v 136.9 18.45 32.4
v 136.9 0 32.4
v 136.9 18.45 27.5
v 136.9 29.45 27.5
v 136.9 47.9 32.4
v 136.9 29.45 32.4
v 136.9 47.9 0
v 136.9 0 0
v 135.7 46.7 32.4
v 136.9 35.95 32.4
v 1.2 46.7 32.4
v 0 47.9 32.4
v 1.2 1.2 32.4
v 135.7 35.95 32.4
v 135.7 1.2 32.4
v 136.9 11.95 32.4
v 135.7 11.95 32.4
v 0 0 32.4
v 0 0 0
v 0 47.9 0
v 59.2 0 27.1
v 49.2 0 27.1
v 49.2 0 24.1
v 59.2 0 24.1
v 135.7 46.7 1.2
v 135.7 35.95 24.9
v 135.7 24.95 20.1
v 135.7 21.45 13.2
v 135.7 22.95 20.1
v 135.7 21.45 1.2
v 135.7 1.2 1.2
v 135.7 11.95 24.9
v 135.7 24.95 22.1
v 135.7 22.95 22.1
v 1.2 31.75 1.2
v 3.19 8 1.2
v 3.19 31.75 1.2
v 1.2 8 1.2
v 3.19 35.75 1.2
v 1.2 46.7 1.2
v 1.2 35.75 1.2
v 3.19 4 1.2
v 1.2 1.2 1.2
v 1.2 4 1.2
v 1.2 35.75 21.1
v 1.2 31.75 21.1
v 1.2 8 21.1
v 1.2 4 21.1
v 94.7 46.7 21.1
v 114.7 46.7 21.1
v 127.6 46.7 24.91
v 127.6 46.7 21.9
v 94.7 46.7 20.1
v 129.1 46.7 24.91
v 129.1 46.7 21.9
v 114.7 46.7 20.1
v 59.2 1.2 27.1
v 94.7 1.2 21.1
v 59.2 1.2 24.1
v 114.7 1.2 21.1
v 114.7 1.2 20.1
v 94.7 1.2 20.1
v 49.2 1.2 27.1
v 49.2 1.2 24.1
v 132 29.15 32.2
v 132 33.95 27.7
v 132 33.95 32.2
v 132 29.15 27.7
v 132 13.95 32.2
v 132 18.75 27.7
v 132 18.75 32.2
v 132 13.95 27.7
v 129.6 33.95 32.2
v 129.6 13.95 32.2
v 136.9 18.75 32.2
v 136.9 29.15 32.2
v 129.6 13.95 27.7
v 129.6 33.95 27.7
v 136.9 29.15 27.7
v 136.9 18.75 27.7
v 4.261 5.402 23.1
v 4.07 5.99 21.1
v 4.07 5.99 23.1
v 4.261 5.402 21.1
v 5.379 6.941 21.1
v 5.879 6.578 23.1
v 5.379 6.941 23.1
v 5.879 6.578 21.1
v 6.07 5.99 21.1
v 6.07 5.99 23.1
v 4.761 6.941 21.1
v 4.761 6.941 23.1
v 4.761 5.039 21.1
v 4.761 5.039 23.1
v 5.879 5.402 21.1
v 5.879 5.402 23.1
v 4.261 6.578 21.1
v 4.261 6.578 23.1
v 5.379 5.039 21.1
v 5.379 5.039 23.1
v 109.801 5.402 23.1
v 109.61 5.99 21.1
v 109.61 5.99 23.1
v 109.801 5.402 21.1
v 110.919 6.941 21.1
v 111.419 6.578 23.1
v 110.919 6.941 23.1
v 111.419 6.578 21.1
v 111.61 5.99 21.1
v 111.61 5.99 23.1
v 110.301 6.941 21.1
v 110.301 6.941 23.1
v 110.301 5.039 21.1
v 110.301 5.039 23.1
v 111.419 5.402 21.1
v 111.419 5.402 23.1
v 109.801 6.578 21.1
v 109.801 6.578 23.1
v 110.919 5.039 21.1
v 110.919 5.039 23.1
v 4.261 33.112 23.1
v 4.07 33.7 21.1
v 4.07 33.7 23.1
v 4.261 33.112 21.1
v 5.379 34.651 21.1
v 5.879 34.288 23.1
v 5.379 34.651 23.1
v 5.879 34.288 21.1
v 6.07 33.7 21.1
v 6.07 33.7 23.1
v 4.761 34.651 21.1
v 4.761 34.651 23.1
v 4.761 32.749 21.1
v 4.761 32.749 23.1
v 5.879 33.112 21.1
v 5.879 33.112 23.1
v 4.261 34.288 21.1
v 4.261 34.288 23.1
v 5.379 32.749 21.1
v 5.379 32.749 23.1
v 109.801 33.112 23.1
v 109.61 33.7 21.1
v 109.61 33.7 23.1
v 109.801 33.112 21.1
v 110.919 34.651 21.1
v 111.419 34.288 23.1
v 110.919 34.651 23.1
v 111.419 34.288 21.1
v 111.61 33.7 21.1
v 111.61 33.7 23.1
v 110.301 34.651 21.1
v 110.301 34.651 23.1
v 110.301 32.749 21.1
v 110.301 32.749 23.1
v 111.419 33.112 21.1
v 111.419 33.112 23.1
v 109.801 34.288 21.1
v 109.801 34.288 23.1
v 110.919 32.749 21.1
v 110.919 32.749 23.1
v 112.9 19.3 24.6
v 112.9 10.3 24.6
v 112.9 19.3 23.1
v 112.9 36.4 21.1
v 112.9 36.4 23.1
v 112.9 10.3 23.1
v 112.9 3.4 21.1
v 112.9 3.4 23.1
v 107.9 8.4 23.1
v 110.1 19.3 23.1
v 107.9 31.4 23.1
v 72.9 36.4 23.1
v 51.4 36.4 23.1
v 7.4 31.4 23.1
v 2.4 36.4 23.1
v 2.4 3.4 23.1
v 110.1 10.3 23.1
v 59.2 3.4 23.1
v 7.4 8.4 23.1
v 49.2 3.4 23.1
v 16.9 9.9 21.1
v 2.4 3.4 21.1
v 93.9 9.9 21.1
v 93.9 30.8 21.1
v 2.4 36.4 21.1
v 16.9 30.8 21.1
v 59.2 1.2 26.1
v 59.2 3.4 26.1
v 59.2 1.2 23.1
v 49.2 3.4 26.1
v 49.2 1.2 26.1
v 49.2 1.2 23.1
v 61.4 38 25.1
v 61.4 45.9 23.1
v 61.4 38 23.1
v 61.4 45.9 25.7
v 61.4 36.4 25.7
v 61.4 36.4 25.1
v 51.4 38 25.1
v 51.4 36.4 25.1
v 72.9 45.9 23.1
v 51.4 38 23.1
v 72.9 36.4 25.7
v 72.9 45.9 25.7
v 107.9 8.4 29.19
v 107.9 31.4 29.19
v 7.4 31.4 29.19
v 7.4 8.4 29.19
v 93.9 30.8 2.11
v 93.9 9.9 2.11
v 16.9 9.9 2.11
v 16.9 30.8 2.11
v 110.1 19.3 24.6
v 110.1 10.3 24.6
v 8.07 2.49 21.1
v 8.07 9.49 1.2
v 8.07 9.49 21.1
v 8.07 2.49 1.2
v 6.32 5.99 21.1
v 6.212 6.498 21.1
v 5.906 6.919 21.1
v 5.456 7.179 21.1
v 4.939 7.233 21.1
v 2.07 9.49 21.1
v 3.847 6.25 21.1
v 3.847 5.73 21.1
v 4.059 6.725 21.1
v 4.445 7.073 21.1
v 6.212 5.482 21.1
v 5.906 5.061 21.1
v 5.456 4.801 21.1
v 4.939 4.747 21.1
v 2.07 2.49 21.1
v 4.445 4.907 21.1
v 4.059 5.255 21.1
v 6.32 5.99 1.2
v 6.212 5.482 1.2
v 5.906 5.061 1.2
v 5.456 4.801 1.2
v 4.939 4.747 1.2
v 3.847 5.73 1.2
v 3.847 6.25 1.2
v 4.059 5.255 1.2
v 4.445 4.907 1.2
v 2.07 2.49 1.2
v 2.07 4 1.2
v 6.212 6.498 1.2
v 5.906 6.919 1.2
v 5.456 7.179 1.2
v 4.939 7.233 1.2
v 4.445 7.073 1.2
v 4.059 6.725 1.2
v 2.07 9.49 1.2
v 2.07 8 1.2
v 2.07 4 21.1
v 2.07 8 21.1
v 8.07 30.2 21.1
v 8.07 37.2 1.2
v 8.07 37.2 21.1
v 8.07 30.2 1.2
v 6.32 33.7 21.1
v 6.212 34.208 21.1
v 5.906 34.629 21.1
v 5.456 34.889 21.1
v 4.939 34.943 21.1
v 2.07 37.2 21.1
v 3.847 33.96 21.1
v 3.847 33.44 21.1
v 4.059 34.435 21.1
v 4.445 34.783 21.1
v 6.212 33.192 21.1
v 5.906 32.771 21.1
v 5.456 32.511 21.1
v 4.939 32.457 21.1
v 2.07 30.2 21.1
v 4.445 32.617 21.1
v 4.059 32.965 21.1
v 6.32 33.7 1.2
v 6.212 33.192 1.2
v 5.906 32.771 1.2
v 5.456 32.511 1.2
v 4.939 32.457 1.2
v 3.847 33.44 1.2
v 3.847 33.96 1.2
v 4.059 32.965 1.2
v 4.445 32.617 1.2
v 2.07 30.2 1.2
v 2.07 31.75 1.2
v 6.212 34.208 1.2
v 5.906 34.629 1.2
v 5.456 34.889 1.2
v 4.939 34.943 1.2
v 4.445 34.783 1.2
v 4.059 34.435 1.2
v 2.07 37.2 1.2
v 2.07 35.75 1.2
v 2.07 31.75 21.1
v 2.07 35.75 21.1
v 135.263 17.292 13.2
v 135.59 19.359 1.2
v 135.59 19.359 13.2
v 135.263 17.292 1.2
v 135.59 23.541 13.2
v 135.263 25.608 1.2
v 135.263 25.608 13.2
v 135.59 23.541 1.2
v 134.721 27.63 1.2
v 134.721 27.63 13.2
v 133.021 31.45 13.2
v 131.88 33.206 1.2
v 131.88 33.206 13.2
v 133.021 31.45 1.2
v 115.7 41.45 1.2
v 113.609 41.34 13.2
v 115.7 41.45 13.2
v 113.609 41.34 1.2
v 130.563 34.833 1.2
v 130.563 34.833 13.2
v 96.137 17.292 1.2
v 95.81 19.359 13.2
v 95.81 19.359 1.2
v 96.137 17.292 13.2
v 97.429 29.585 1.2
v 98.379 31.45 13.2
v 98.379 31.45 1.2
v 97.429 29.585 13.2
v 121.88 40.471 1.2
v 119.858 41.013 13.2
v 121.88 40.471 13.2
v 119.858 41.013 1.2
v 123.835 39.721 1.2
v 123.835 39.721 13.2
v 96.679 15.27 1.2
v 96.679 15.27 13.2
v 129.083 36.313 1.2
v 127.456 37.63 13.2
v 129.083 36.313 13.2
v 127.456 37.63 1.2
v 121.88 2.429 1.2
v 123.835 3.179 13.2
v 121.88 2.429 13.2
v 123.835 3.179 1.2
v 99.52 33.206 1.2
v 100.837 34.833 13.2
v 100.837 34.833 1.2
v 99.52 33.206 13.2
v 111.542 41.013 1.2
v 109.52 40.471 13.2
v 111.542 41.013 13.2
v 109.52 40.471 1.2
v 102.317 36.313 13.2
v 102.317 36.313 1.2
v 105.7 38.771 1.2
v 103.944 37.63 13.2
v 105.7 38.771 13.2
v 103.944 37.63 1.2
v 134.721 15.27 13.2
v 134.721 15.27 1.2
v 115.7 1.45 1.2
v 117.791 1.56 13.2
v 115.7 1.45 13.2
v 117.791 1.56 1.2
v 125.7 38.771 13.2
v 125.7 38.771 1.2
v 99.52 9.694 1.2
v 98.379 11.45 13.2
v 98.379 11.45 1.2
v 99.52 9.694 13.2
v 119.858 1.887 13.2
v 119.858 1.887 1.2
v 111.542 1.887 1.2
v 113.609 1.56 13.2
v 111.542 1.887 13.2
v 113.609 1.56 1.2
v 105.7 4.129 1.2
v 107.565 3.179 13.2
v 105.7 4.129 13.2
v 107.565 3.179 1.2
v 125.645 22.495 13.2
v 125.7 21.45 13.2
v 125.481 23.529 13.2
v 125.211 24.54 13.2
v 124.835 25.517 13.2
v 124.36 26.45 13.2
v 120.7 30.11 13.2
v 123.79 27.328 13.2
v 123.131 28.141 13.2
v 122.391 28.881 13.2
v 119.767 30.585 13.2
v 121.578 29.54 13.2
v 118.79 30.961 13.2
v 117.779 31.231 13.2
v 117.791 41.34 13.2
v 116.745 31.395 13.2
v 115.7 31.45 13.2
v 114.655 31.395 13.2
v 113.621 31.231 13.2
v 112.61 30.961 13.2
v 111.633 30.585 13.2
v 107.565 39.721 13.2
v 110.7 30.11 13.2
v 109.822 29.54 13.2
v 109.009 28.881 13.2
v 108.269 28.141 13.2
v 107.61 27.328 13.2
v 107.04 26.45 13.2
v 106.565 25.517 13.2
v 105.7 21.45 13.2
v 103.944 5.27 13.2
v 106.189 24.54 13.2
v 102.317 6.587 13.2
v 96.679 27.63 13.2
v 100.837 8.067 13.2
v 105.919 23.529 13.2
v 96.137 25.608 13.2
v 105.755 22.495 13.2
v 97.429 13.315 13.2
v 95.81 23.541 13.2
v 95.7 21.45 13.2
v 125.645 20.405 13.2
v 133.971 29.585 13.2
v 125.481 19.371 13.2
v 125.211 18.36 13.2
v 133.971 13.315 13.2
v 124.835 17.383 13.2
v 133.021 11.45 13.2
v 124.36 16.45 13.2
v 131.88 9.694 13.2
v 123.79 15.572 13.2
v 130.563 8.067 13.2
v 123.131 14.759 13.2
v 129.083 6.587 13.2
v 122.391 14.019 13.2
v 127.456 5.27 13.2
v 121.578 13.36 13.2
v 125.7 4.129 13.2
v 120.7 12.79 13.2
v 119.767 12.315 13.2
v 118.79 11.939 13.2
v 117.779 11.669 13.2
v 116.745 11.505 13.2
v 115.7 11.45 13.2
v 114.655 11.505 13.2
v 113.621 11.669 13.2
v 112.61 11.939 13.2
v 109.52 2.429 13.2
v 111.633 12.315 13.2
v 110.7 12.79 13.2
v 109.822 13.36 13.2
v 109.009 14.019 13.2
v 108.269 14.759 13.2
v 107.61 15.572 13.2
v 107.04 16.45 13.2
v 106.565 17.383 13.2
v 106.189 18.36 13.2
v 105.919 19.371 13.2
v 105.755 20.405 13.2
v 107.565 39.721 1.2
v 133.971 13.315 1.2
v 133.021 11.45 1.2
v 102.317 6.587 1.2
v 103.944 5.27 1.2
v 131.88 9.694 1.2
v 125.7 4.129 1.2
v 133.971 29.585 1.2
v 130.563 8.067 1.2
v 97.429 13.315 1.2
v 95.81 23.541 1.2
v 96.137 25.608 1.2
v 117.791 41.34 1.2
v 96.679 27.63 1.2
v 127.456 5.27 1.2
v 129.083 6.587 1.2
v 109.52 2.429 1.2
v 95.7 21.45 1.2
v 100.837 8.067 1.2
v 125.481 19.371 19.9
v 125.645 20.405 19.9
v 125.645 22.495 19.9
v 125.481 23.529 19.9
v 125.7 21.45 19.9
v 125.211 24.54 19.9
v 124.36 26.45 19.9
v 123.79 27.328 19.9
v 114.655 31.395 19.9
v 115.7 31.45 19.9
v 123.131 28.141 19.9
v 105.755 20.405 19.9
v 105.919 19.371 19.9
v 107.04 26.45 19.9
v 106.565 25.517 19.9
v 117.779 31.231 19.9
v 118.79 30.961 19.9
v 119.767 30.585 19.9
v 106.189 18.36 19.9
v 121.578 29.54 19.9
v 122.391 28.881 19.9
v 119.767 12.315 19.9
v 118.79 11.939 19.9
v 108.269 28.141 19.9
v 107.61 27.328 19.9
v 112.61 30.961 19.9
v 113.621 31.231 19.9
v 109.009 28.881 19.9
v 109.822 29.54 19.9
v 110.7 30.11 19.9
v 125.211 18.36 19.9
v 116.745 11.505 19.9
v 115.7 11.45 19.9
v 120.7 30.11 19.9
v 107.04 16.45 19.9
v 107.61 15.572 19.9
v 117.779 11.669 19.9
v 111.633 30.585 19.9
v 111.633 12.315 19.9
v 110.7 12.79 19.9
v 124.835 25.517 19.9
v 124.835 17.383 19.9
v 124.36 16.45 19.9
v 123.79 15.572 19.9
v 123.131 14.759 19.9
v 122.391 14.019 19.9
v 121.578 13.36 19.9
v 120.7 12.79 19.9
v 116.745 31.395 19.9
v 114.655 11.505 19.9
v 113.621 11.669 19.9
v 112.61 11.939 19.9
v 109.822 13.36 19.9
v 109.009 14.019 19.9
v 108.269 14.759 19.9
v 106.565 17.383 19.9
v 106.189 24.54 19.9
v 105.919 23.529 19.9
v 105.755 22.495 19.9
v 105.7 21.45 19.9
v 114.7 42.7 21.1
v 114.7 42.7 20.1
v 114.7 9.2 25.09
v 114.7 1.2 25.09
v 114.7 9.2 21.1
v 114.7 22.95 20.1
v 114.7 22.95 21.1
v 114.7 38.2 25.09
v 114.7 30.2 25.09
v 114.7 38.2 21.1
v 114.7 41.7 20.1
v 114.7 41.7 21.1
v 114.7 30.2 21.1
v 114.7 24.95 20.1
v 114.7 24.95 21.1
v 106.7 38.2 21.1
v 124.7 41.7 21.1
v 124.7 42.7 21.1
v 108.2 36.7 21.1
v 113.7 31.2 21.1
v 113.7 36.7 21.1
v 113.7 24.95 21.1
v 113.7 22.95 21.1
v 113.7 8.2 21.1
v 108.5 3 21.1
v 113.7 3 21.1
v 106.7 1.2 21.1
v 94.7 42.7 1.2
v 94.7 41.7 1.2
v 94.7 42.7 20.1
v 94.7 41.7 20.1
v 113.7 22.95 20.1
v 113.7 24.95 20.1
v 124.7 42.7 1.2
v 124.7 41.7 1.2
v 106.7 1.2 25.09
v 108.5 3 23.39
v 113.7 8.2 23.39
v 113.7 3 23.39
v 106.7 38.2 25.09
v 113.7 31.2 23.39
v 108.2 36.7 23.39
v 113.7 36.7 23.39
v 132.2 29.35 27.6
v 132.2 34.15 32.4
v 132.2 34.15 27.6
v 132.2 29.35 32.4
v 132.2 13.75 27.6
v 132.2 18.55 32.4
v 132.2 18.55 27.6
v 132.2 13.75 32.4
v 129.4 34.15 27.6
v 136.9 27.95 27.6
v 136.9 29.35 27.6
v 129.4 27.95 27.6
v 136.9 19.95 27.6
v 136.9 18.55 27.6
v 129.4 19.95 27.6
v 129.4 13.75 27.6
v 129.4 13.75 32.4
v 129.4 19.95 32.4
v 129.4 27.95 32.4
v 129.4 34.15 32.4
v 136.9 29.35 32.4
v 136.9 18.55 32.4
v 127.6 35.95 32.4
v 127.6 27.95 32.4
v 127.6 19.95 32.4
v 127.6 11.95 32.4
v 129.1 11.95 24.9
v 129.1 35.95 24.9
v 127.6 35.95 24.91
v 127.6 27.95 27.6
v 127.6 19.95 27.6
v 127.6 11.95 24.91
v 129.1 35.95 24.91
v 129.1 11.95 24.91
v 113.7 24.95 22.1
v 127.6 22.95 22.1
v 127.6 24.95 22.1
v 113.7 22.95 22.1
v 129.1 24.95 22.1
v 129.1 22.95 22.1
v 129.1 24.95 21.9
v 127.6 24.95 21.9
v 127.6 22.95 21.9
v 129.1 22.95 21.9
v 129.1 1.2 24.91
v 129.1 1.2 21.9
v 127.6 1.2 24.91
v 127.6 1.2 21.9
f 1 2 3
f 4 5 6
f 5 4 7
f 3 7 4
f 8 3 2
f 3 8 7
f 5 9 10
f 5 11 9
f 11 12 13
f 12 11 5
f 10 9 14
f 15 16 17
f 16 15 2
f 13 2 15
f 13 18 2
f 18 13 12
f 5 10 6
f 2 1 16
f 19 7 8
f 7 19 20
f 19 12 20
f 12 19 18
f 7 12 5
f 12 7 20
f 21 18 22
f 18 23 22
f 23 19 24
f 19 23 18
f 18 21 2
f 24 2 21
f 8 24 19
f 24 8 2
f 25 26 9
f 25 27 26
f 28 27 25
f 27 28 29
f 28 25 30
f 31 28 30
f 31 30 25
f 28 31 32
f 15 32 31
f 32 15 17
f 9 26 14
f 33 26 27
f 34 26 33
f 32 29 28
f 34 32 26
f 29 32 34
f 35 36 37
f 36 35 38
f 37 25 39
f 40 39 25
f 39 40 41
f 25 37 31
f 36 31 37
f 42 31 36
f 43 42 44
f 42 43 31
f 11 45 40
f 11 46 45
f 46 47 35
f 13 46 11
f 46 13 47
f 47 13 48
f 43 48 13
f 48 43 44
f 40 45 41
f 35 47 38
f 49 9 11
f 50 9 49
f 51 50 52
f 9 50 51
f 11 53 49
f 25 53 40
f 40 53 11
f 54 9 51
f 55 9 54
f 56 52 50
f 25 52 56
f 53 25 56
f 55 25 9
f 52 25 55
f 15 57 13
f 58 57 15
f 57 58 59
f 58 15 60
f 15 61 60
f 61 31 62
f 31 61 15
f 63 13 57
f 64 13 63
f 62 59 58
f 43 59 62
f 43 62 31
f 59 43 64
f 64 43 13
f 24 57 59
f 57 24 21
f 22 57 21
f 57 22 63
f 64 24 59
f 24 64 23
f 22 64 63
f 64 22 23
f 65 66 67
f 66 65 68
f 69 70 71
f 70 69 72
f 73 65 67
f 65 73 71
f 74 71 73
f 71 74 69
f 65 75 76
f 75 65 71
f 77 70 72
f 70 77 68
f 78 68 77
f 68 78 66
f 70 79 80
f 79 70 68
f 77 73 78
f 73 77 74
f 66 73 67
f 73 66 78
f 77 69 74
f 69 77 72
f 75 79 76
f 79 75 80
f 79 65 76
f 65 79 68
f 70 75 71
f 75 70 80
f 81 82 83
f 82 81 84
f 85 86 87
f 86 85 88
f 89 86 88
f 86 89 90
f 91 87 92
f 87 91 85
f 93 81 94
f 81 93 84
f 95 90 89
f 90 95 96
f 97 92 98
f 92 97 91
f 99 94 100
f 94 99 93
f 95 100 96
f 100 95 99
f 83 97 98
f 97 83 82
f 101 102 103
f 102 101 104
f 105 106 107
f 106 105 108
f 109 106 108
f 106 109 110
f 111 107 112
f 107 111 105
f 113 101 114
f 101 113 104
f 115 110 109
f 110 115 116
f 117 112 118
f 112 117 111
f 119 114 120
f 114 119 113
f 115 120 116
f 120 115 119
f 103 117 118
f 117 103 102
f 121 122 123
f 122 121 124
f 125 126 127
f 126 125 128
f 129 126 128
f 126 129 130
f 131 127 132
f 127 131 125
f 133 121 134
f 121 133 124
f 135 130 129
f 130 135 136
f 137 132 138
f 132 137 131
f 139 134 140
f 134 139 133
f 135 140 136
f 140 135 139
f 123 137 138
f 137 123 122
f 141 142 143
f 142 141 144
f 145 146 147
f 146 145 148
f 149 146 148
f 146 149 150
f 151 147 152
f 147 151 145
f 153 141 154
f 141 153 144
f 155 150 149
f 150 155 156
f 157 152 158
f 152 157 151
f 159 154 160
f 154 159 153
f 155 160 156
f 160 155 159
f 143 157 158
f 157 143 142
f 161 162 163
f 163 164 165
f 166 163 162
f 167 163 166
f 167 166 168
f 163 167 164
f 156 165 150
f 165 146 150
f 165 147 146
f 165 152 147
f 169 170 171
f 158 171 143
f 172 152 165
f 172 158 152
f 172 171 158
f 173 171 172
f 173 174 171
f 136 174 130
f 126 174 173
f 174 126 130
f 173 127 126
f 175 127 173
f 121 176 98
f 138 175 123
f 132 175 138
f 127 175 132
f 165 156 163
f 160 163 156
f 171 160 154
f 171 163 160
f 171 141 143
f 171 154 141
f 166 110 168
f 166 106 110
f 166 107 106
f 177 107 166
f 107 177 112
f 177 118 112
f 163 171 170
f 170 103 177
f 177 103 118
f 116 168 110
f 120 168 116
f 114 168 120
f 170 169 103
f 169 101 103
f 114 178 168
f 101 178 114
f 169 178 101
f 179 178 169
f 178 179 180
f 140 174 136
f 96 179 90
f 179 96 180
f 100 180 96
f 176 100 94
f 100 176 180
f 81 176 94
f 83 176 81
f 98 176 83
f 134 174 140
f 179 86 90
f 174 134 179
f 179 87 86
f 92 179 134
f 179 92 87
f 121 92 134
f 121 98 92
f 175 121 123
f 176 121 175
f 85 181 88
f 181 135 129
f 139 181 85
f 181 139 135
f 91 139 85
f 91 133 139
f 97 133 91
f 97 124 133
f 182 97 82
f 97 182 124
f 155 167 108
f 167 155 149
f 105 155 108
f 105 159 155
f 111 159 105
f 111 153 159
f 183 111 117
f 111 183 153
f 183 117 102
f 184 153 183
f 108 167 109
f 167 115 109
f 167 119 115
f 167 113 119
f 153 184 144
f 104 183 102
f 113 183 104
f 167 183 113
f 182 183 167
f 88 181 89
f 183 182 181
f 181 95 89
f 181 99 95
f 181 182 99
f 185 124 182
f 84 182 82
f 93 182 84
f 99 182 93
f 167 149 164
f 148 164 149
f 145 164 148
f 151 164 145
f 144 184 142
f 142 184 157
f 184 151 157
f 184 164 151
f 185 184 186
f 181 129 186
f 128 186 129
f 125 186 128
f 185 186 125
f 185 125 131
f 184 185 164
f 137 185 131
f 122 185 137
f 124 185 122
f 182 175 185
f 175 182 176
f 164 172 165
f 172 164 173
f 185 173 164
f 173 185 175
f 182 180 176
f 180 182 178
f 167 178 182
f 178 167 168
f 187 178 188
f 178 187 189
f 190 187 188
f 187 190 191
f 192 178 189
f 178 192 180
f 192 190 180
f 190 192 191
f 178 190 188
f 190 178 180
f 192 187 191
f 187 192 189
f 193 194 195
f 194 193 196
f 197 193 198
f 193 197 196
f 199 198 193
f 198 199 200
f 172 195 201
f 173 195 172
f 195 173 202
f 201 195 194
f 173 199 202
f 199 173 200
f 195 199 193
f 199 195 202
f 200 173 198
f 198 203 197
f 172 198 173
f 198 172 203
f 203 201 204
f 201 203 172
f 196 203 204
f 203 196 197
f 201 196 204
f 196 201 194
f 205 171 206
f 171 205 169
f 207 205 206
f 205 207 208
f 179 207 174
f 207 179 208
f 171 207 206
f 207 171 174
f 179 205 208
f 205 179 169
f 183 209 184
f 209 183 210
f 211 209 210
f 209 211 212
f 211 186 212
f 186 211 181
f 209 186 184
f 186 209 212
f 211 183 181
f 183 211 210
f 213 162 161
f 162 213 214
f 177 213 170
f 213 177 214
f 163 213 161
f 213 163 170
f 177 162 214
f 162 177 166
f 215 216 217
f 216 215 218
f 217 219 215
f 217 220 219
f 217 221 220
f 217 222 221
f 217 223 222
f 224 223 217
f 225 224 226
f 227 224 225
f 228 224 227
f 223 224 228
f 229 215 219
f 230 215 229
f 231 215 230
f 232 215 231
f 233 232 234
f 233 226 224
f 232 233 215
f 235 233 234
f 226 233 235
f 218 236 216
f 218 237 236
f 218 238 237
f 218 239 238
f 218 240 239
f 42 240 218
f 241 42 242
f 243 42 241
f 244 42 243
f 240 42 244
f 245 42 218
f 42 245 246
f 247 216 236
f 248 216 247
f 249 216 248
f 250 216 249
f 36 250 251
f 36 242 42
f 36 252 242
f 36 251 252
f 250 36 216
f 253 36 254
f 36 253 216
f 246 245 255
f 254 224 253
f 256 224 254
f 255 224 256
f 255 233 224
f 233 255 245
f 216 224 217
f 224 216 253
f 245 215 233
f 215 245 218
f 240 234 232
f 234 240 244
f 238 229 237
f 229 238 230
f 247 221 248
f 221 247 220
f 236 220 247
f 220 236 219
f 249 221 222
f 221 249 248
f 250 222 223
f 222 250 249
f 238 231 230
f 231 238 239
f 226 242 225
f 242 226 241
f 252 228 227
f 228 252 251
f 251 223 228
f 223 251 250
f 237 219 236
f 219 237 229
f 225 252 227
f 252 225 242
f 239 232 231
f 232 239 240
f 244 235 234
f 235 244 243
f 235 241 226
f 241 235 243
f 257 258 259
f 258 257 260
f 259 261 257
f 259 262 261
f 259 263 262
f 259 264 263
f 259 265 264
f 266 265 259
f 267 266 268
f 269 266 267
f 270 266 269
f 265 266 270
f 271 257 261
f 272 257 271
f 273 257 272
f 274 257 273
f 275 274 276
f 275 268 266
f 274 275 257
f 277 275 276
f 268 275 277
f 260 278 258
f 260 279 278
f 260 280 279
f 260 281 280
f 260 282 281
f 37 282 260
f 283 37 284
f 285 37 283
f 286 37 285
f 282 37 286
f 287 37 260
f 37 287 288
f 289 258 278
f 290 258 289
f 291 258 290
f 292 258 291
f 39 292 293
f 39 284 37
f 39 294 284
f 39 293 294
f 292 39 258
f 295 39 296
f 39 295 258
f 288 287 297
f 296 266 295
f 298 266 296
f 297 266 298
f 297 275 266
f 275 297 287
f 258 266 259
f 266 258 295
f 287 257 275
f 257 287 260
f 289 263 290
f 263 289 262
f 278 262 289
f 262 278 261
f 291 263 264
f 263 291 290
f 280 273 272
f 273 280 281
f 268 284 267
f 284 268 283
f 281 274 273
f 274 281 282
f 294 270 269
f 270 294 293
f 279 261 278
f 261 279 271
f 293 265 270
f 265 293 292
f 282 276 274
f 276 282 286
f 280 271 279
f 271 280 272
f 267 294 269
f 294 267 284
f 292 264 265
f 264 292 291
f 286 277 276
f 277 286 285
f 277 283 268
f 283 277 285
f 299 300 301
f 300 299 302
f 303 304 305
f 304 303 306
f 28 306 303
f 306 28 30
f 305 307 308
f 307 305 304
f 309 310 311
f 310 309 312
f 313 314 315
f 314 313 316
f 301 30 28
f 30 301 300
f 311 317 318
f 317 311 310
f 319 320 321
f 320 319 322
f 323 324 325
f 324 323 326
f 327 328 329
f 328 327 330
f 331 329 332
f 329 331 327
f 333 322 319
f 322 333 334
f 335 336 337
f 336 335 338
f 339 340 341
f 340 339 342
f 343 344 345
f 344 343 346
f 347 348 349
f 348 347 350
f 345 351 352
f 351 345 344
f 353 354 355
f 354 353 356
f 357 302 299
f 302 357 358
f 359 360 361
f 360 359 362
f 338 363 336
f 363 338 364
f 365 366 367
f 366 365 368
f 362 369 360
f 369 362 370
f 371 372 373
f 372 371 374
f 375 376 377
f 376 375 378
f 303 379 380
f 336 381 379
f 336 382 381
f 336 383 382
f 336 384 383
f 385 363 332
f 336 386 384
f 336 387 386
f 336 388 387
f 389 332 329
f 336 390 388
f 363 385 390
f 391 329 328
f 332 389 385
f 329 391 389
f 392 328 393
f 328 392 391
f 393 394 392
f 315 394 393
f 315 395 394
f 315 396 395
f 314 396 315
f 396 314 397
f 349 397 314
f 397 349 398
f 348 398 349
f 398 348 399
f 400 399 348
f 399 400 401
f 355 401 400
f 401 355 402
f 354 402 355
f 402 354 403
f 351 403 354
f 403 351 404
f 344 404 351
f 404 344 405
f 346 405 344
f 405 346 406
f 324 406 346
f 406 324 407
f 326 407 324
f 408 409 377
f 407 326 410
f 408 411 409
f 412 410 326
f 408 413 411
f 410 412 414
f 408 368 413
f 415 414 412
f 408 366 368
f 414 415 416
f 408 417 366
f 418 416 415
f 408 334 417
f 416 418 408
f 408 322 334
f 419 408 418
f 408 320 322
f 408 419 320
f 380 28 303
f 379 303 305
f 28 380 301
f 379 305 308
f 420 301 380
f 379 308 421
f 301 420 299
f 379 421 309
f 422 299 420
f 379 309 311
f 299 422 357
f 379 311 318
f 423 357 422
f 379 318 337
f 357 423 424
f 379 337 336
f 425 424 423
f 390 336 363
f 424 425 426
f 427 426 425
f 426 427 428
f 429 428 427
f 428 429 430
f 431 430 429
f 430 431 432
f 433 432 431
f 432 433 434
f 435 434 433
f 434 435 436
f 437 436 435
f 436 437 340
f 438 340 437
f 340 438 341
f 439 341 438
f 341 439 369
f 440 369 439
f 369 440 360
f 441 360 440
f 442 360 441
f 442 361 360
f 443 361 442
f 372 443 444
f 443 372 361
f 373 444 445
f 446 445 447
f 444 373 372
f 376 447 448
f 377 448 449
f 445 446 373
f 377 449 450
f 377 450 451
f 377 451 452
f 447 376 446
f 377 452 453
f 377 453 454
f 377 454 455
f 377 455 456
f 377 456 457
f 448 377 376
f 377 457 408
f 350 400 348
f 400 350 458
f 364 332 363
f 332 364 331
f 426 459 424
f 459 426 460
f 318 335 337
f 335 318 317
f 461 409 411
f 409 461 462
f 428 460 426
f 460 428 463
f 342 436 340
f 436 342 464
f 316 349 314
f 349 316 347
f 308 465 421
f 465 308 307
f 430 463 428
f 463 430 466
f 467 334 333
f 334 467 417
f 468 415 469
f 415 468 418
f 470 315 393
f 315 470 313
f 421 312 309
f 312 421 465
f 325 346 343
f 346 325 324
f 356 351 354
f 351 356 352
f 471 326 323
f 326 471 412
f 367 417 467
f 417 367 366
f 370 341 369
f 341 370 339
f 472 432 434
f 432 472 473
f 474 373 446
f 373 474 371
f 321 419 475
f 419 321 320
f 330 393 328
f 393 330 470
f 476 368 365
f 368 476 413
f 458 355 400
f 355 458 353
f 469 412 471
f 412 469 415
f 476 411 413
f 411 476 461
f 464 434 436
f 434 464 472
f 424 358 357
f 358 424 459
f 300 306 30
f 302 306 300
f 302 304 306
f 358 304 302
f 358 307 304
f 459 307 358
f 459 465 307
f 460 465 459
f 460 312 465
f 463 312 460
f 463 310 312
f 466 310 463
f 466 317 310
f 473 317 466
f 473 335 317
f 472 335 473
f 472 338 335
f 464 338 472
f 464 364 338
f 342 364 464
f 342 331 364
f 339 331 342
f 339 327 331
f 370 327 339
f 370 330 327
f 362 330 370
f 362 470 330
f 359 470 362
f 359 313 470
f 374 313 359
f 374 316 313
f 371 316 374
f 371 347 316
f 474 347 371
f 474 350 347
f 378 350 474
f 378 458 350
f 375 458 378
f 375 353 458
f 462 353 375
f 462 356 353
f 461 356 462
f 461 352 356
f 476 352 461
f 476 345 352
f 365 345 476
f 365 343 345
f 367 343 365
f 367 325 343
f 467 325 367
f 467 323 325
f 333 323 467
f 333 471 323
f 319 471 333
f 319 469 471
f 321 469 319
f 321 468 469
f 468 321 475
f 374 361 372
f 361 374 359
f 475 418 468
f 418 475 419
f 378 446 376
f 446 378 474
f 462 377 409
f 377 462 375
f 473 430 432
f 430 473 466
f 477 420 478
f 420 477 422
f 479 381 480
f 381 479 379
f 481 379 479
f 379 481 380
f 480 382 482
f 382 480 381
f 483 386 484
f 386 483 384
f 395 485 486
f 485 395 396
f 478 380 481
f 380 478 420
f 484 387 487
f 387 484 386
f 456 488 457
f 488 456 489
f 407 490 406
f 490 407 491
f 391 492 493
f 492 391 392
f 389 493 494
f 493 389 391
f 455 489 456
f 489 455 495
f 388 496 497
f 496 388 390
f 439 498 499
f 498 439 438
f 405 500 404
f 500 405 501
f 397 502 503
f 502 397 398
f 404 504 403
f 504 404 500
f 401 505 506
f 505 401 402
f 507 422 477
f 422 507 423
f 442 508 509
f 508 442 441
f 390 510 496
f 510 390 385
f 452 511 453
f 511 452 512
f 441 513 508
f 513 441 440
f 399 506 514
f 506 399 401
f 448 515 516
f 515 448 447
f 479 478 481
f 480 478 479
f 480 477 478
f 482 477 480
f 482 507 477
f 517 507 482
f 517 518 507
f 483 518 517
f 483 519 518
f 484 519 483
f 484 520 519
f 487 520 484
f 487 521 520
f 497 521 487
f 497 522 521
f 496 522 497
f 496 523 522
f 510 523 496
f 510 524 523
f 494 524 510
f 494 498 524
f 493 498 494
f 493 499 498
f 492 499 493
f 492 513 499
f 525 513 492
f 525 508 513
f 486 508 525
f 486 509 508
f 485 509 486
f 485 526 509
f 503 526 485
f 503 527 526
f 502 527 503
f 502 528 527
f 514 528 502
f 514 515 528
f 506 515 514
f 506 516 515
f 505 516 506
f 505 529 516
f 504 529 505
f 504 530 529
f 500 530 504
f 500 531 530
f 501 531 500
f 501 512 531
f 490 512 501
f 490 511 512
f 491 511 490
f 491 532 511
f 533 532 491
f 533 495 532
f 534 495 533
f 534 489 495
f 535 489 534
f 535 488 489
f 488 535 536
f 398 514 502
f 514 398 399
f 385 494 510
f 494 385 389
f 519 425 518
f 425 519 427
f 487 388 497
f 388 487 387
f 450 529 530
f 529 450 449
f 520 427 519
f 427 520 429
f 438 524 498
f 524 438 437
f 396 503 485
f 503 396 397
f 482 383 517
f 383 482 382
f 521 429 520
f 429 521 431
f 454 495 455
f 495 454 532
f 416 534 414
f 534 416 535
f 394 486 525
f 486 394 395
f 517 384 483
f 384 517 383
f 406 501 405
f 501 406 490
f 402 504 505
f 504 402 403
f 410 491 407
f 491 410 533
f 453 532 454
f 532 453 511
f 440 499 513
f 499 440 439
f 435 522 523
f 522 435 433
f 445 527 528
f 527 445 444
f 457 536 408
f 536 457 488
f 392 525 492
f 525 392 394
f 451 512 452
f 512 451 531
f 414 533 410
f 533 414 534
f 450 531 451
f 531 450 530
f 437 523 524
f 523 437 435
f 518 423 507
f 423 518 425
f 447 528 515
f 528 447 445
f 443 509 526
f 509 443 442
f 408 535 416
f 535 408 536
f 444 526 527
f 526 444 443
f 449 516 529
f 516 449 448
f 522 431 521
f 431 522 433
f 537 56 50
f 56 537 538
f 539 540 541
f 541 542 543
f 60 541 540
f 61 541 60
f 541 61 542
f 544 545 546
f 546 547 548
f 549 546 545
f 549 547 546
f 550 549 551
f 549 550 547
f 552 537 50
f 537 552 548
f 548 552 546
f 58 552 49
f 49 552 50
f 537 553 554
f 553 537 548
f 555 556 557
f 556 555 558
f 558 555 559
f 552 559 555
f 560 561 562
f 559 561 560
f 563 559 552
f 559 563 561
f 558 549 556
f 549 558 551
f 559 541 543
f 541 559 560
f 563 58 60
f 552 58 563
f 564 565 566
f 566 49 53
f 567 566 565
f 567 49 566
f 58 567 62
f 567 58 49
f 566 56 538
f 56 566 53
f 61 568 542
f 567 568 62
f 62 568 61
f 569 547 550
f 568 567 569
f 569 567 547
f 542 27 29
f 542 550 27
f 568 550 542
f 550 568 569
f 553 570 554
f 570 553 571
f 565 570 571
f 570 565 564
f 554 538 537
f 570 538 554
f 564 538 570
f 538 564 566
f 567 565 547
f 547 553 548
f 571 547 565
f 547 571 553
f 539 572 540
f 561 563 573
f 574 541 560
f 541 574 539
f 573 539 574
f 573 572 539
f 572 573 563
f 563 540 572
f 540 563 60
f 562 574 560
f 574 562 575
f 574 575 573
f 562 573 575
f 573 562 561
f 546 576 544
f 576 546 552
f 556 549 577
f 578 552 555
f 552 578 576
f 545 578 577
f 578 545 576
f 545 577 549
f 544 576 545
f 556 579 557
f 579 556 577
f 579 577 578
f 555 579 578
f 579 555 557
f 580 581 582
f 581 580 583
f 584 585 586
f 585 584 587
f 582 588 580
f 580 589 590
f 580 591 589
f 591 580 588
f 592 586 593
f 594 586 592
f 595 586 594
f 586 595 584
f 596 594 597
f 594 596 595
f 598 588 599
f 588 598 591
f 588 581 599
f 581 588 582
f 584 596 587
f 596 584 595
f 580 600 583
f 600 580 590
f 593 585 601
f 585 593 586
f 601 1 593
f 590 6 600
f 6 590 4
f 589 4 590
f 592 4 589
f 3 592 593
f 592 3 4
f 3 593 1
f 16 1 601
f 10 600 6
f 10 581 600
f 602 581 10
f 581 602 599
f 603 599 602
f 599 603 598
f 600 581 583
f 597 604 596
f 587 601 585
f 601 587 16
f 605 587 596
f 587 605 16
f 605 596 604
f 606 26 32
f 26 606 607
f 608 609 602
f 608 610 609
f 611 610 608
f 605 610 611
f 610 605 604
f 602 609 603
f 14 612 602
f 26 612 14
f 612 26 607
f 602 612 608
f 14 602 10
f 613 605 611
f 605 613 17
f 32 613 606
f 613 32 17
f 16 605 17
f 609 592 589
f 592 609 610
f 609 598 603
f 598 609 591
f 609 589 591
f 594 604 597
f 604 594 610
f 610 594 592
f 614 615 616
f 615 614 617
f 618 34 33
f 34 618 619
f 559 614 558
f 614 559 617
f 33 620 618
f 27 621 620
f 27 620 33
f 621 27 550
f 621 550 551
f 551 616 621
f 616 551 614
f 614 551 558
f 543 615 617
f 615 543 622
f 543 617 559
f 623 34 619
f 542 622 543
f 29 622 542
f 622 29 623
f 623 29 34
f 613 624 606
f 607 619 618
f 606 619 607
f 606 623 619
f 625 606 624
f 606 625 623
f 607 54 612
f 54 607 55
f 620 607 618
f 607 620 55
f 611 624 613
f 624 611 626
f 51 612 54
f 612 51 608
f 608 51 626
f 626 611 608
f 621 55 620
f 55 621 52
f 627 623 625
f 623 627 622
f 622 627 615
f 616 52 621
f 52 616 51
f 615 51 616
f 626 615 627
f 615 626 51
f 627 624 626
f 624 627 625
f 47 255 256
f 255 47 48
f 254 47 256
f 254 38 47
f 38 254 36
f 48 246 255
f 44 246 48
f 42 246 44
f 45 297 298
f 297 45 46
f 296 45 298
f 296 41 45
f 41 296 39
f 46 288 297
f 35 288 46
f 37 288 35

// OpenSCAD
board_size = [110.5, 33, 2];

board_top_height = 6.1;

board_batt_size = [77, 20.9, 19];
board_batt_pos = [14.5, 6.5];

board_sw_overflow = 2.2;
board_sw_x = 46.8;
board_sw_hole = [10, 3];

board_usb_overflow = 1.6;
board_usb_x = 49;
board_usb_hole = [10, 2];

board_sd_overflow = 9.5;
board_sd_x = 59;
board_sd_size = [11.5, 2.6];

board_holes_x = [2.67, board_size.x - 2.29];
board_holes_y = 2.59;
board_holes_dist = 27.71;
board_holes_dia = 2;

board_antennas_size = [2.8, 9, 1.5];
board_antennas_pos = [board_size.x - board_antennas_size.x, 6.9];

usb_sck_size = [7.3 - 2.4, 10.4, 4.5];
usb_sck_foot_size = [2.4, 2 * 4.8 + usb_sck_size.y, 4.5];

speaker_dia = 40;
speaker_dia2 = 20;
speaker_height = 18.7;

// ---------------------------------------------

board_h = speaker_height + 1.2;

left_inset = 1;

fatness = 1.2;
inset = .2;

DEBUG = true;
//DEBUG = false;

// ---------------------------------------------

inner_box = [134.5, 45.5, 30];

box = [inner_box.x + 2 * fatness, inner_box.y + 2 * fatness, inner_box.z + 2 * fatness];

echo("Box size ", box.x, " x ", box.y, " x ", box.z);
echo("Inner box size ", inner_box.x, " x ", inner_box.y, " x ", inner_box.z);

// ---------------------------------------------

module triangle(o_len, a_len, depth, center = false) {
    centroid = center ? [- a_len / 3, - o_len / 3, - depth / 2] : [0, 0, 0];
    translate(centroid) linear_extrude(height = depth)
        {
            polygon(points = [[0, 0], [a_len, 0], [0, o_len]], paths = [[0, 1, 2]]);
        }
}

module Board(x, y, z) {
    translate([x, y, z]) union() {
        difference() {
            color("black") cube(board_size);
            for (r = [0:1]) {
                translate([board_holes_x[0], board_holes_y + r * board_holes_dist, - .01])
                    cylinder(d = board_holes_dia, h = 10, $fn = 10);
                translate([board_holes_x[1], board_holes_y + r * board_holes_dist, - .01])
                    cylinder(d = board_holes_dia, h = 10, $fn = 10);
            }
        }

        color("gray") {
            translate([board_sw_x, - board_sw_overflow, board_size.z]) cube([board_sw_hole[0], board_sw_overflow, board_sw_hole[1]]);

            translate([board_usb_x, board_size.y, board_size.z]) cube([board_usb_hole[0], board_usb_overflow, board_usb_hole[1]]);
            translate([board_sd_x, board_size.y, board_size.z]) cube([board_sd_size[0], board_sd_overflow, board_sd_size[1]]);
        }

        color("gray") translate([5, 5, board_size.z - .01]) cube([board_size.x - 10, board_size.y - 10, board_top_height]);

        color("gray") translate([board_batt_pos.x, board_batt_pos.y, - board_batt_size.z + .01]) {
            cube(board_batt_size);
        }

        color("orange") translate([board_antennas_pos.x, board_antennas_pos.y, board_size.z]) cube(board_antennas_size);
    }
}

module Speaker(x, y, z) {
    bottom_height = 12;
    translate([x + speaker_dia / 2, y + speaker_dia / 2, z]) color("black") {
        cylinder(h = bottom_height, d = speaker_dia, $fn = 60);
        translate([0, 0, bottom_height]) cylinder(h = speaker_height - bottom_height, d = speaker_dia2, $fn = 60);
    }
}

module BoardCol(x, y, z, h) {
    side = [6, 7];
    hole_dia = 2.5;

    difference() {
        translate([x - (side.x / 2), y - (side.y / 2), z]) {
            color("blue") cube([side.x, side.y, h]);
        }
        translate([x, y, z - .01]) {
            color("green") cylinder(d = hole_dia, h = h + .02, $fn = 15);
        }
    }
}

module UsbSocket(x, y, z) {
    translate([x, y, z]) union() color("black") {
        cube(usb_sck_foot_size);
        translate([usb_sck_foot_size.x, (usb_sck_foot_size.y - usb_sck_size.y) / 2]) cube(usb_sck_size);
    }
}

// ---------------------------------------------

// bottom
difference() {
    // main box
    union() {
        difference() {
            cube(box);
            translate([fatness, fatness, fatness]) {
                cube([inner_box.x, inner_box.y, box.z]);
            }

            // switch hole
            translate([fatness + inset + left_inset + board_sw_x, - .01, fatness + board_h + board_size.z + 1]) // +1 = correction
                cube([board_sw_hole[0], 10, board_sw_hole[1]]);

            // USB socket hole
            translate([box.x - usb_sck_size.x - usb_sck_foot_size.x, (box.y - usb_sck_size.y) / 2 - .3, box.z - usb_sck_foot_size.z - .4]) {
                cube([100, 11, 100]);
            }

//            // DEBUG - front wall
//            translate([fatness, - .01, fatness]) cube([inner_box.x, fatness + .02, 100]);
//            // DEBUG - right wall
//            translate([box.x - fatness - .01, fatness, fatness]) cube([100, inner_box.y, 100]);
        }

        // USB socket
        if (DEBUG) {
            UsbSocket(box.x - usb_sck_size.x - usb_sck_foot_size.x, (box.y - usb_sck_foot_size.y) / 2, box.z - usb_sck_foot_size.z - .2);
        }

        // the +1 is a space tolerance for the board
        translate([fatness + left_inset, fatness, fatness]) {
            translate([.2, .2]) {
                if (DEBUG) Board(0, 2, board_h);
                BoardCol(board_holes_x[0], 2 + board_holes_y, 0, board_h);
                BoardCol(board_holes_x[0], 2 + board_holes_y + board_holes_dist, 0, board_h);
            }

            // speaker holder
            translate([board_batt_pos.x + board_batt_size.x + 1, 0]) {
                spk_tolerance = .25;
                h = speaker_height + 1.2;

                if (DEBUG) Speaker(1, spk_tolerance, 0);

                translate([0, - fatness]) difference() {
                    cube([20, box.y, h]);
                    translate([- .01, fatness]) cube([100, box.y - 2 * fatness, speaker_height + .2]);
                }

                translate([0, speaker_dia + (spk_tolerance * 2)]) cube([30, 1, h]);
            }

            // board corner-holders
            translate([board_size.x - 14.5, 0]) {
                height_tolerance = .3;

                translate([0, 0, speaker_height + 1.2 - .01]) difference() {
                    translate([16.5, 0]) rotate([0, 0, 90]) triangle(8, 8, 4);
                    translate([8, 1.8]) cube([7.5, 10, board_size.z + height_tolerance]);
                }
                // this is a bit wild... I hope I'll never have to rework this :-|
                translate([0, 37, speaker_height + 1.2 - .01]) difference() {
                    translate([16.5, 0]) rotate([0, 0, 180]) triangle(8, 8, 4);
                    translate([8, - 11.5]) cube([7.5, 10, board_size.z + height_tolerance]);
                }
            }

            // USB socket holder
            translate([inner_box.x - usb_sck_size.x - usb_sck_foot_size.x - 2 + inset,
                        (inner_box.y - usb_sck_foot_size.y) / 2 - 2,
                            inner_box.z - usb_sck_foot_size.z + fatness - 3]) difference() {
                main_cube = [usb_sck_foot_size.x + usb_sck_size.x + 2, usb_sck_foot_size.y + 4, usb_sck_foot_size.z + 3];

                // main cube
                cube(main_cube);

                // socket "hole"
                tolerance = .2;
                translate([2 - tolerance, 2 - tolerance, 3 - .3]) {
                    cube([usb_sck_foot_size.x + (tolerance*2), usb_sck_foot_size.y + (tolerance*2), 100]);
                    translate([usb_sck_foot_size.x, (usb_sck_foot_size.y - usb_sck_size.y) / 2])
                        cube([100, usb_sck_size.y + (tolerance*2), 100]);
                }

                // cables hole (to inside)
                translate([- .01, (main_cube.y - 8) / 2, 3 - .3]) {
                    cube([10, 8, 10]);
                }
            }

            // weird construction helpers (to support the USB socket holder printing)
            translate([board_batt_pos.x + board_batt_size.x + 20, (inner_box.y - 2) / 2, speaker_height + .2]) color("blue") {
                l = inner_box.x - (board_batt_pos.x + board_batt_size.x + 20);
                cube([l, 2, 2]);
            }
            translate([inner_box.x - 9.1, 0, speaker_height + 2]) color("blue") {
                cube([1.5, inner_box.y, 3 + .01]);
            }
        }

        // cols & wall connections
        translate([fatness - .01, 4, fatness]) cube([2, 4, board_h]);
        translate([fatness - .01, board_size.y - 1.25, fatness]) cube([2, 4, board_h]);
    }
}

//// cover
//translate([0, - 60])
//    //    translate([- fatness - inset / 2, 30 + box.y + fatness + inset / 2, box.z + fatness + inset]) rotate([180])
//    difference() {
//        size_inner = box;
//        size_outter = [box.x + 2 * fatness + inset, box.y + 2 * fatness + inset, box.z + fatness + inset];
//
//        // main box
//        union() {
//            difference() {
//                cube([size_outter.x, size_outter.y, size_outter.z]);
//                translate([fatness + inset / 2, fatness + inset / 2, fatness]) {
//                    cube([size_inner.x, size_inner.y, 100]);
//                }
//            }
//        }
//    }
